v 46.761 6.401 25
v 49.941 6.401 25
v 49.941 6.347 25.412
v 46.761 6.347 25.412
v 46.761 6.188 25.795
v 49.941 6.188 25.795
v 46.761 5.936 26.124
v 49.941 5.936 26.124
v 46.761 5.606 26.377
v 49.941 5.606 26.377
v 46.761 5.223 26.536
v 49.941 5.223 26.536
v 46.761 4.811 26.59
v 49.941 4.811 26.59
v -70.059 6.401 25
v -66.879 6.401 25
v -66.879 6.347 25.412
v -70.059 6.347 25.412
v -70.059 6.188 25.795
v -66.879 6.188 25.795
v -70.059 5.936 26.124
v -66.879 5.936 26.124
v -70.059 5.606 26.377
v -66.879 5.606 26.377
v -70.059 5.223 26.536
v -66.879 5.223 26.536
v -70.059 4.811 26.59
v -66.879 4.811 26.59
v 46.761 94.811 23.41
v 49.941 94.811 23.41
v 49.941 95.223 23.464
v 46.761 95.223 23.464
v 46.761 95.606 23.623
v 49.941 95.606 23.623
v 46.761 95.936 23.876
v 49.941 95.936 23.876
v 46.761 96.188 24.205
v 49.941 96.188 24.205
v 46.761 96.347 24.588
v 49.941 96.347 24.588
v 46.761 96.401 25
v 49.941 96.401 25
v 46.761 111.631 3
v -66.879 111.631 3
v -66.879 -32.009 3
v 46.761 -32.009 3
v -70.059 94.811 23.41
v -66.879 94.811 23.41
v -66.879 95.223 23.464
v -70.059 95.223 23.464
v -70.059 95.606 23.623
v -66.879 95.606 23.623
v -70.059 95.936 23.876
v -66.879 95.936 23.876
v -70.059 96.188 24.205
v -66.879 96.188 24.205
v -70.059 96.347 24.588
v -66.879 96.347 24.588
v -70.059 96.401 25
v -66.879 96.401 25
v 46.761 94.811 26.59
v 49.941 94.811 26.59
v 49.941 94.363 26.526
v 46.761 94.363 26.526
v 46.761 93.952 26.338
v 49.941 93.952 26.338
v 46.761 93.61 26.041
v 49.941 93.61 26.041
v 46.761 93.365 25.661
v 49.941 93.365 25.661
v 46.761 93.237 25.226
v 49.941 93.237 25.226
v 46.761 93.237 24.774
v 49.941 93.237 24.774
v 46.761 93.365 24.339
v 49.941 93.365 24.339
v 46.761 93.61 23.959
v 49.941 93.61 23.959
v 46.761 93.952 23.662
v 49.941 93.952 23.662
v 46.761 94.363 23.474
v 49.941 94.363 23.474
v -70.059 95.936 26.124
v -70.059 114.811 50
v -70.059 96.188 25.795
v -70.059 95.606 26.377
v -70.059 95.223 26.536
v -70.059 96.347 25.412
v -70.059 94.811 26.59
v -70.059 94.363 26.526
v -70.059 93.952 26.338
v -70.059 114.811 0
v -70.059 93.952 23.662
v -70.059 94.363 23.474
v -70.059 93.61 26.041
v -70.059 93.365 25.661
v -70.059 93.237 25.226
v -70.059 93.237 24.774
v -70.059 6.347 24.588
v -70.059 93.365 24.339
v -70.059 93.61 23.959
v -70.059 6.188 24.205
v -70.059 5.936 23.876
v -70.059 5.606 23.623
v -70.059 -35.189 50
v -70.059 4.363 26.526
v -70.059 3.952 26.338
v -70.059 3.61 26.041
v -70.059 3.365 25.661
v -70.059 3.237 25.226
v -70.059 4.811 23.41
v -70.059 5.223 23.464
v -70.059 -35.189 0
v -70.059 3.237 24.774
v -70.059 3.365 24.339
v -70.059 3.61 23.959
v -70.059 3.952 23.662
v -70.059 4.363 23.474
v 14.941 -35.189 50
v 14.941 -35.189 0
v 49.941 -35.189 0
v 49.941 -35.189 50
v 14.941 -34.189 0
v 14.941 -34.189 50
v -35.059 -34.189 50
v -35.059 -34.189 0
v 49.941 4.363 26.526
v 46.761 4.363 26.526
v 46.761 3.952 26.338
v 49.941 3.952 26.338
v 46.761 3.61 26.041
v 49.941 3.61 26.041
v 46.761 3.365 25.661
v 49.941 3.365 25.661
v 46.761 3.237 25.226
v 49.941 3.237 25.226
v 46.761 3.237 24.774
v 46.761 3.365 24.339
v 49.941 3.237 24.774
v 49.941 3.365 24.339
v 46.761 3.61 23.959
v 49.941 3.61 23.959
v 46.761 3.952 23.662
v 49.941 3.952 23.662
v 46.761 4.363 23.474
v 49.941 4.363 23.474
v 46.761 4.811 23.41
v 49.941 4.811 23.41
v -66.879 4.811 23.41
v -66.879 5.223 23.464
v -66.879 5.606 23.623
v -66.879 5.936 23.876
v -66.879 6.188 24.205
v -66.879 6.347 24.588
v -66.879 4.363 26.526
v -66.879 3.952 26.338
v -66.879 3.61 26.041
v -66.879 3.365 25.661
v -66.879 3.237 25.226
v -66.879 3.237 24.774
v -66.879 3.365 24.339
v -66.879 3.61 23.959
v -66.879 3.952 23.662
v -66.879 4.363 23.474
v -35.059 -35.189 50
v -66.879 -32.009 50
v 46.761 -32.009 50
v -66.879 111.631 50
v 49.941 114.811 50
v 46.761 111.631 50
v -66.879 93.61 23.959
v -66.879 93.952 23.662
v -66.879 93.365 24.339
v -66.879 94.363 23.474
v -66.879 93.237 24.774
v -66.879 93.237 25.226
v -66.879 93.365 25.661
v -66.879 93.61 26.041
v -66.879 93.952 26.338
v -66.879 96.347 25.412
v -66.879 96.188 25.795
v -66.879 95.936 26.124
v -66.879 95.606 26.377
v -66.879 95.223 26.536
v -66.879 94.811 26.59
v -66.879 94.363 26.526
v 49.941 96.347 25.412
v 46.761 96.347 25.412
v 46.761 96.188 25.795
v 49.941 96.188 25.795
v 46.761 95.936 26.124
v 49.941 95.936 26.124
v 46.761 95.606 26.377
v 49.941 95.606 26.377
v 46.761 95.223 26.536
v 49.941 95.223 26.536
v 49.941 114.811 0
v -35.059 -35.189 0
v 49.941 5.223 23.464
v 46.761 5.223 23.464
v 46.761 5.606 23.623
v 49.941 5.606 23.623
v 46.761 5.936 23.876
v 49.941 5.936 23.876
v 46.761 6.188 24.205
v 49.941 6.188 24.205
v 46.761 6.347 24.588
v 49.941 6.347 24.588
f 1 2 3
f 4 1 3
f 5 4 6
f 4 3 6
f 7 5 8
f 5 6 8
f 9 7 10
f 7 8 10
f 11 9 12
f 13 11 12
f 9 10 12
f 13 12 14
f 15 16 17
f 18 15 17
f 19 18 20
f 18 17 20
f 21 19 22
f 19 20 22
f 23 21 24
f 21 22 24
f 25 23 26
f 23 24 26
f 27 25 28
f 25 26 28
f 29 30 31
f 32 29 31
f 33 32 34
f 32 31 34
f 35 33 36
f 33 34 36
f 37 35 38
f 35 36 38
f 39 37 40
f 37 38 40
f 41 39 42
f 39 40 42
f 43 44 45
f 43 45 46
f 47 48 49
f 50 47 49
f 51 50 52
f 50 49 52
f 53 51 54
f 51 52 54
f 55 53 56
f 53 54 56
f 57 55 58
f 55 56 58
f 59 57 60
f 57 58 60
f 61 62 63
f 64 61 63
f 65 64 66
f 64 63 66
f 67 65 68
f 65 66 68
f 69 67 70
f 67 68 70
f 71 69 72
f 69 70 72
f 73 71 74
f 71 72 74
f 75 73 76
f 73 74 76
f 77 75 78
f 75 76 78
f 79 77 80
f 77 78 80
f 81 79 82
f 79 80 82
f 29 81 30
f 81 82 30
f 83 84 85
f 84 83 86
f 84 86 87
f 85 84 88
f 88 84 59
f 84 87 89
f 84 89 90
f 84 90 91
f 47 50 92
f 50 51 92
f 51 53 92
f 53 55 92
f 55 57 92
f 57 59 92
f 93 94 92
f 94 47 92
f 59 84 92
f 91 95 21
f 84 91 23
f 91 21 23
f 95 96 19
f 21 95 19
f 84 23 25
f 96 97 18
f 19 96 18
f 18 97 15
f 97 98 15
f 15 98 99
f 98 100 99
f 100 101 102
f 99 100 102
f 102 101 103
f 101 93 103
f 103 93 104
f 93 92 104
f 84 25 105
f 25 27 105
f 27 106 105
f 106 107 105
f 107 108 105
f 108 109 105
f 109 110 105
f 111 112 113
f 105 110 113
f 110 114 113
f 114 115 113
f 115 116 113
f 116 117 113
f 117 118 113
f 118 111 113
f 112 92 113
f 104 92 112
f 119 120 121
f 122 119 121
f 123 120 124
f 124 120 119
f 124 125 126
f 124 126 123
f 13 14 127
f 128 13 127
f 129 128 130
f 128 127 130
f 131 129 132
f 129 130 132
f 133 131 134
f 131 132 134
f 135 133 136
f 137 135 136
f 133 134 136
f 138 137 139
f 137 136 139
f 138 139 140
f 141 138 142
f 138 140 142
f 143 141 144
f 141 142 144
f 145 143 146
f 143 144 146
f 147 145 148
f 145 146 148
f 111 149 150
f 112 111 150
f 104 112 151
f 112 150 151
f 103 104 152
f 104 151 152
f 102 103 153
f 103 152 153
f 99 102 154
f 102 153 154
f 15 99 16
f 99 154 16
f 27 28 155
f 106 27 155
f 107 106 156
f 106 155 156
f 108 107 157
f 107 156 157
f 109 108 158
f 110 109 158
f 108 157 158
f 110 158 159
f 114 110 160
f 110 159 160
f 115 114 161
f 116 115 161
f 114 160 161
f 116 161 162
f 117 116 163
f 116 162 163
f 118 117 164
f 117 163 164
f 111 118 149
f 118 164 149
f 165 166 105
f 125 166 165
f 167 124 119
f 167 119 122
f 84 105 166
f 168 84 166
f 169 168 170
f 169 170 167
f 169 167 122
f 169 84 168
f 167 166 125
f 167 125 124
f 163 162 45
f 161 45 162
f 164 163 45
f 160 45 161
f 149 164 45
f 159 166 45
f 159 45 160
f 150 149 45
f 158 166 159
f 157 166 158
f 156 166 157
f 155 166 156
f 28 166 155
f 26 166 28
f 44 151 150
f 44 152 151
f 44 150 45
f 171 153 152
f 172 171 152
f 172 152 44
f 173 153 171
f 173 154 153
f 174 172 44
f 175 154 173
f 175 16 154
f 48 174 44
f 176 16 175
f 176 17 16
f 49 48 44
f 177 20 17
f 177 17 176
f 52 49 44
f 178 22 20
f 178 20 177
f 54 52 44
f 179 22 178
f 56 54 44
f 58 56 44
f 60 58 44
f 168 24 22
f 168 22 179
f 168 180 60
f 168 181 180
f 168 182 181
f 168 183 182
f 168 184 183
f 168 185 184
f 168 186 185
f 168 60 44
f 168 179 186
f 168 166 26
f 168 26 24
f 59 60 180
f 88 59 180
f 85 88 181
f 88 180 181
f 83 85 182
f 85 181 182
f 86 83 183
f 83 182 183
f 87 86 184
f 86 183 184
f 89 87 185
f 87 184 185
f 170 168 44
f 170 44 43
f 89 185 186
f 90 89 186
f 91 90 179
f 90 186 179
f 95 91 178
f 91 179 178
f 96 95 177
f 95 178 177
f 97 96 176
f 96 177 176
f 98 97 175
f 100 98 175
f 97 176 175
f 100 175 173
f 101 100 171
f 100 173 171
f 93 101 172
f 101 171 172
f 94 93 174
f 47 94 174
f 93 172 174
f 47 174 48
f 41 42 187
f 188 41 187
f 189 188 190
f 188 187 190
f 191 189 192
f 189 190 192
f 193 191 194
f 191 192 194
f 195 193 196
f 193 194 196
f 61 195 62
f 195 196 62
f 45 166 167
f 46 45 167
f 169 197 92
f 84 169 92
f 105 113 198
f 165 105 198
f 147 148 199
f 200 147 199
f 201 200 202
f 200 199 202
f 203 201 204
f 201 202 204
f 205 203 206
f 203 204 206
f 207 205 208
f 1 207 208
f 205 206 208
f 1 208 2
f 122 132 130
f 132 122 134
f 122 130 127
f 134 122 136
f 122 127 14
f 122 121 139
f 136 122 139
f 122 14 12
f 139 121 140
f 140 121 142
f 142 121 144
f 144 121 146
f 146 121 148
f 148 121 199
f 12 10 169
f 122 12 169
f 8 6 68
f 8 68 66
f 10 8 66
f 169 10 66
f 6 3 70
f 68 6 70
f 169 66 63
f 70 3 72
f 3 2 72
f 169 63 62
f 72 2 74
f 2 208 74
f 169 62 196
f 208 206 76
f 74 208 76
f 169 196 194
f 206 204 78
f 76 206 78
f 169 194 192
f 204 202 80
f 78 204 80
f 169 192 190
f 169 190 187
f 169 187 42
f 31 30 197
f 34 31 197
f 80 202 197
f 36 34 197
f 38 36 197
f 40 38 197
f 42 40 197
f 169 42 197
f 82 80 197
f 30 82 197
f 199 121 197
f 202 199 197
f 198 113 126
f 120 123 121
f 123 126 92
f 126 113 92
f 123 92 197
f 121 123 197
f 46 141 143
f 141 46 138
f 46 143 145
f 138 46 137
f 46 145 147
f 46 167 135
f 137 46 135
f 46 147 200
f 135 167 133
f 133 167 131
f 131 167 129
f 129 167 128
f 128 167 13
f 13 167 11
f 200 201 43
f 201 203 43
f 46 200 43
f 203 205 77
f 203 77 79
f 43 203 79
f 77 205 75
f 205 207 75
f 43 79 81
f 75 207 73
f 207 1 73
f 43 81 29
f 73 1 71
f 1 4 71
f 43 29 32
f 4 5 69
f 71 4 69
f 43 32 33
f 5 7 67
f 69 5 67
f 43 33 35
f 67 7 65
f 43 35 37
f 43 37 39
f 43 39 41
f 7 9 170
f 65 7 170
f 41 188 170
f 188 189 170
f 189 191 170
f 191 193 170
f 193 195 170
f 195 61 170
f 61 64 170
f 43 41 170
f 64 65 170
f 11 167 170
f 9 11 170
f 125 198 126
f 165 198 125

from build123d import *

# Parameters (mm, degrees)
F0_W     = 113.645
F0_H     = 3.18
F0_W_2   = 3.175
F0_H_2   = 143.64
F0_W_3   = 3.18
F1_DEPTH = 50
F2_W     = 113.64
F2_H     = 143.64
F3_DEPTH = 47
F5_DEPTH = 120.001
F6_W     = 50
F6_H     = 50
F7_DEPTH = 1


with BuildPart() as f1:
    # F0 (on Top) → F1 (new body)
    with BuildSketch(Plane.XY):
        with Locations((-10.0610243238, 113.2212999272)):
            Rectangle(F0_W, F0_H)
        with Locations((-68.4710243238, 113.2212999272)):
            Rectangle(F0_W_2, F0_H)
        with Locations((-68.4710243238, 39.8112999272)):
            Rectangle(F0_W_2, F0_H_2)
        with Locations((-10.0610243238, -33.5987000728)):
            Rectangle(F0_W, F0_H)
        with Locations((48.3514756762, 39.8112999272)):
            Rectangle(F0_W_3, F0_H_2)
        with Locations((48.3514756762, -33.5987000728)):
            Rectangle(F0_W_3, F0_H)
        with Locations((48.3514756762, 113.2212999272)):
            Rectangle(F0_W_3, F0_H)
        with Locations((-68.4710243238, -33.5987000728)):
            Rectangle(F0_W_2, F0_H)
        with Locations((-10.0610243238, 39.8112999272)):
            Rectangle(F0_W, F0_H_2)
    extrude(amount=F1_DEPTH)

    # F2 (on face) → F3 (cut)
    with BuildSketch(Plane.XY.offset(50)):
        with Locations((-10.0585243238, 39.8112999272)):
            Rectangle(F2_W, F2_H)
    extrude(amount=-F3_DEPTH, mode=Mode.SUBTRACT)

    # F4 (on face) → F5 (cut, through all)
    with BuildSketch(Plane.YZ.offset(49.9414756762)):
        with BuildLine():
            ThreePointArc((6.4012999272, 25), (5.9355997093, 26.1242997821), (4.8112999272, 26.59))
            Line((4.8112999272, 26.59), (4.8112999272, 23.41))
            ThreePointArc((4.8112999272, 23.41), (5.9355997093, 23.8757002179), (6.4012999272, 25))
        make_face()
        with BuildLine():
            Line((4.8112999272, 23.41), (4.8112999272, 26.59))
            ThreePointArc((4.8112999272, 26.59), (3.2212999272, 25), (4.8112999272, 23.41))
        make_face()
        with BuildLine():
            ThreePointArc((96.4012999272, 25), (95.9355997093, 26.1242997821), (94.8112999272, 26.59))
            Line((94.8112999272, 26.59), (94.8112999272, 23.41))
            ThreePointArc((94.8112999272, 23.41), (95.9355997093, 23.8757002179), (96.4012999272, 25))
        make_face()
        with BuildLine():
            Line((94.8112999272, 23.41), (94.8112999272, 26.59))
            ThreePointArc((94.8112999272, 26.59), (93.2212999272, 25), (94.8112999272, 23.41))
        make_face()
    extrude(amount=-F5_DEPTH, mode=Mode.SUBTRACT)

    # F6 (on face) → F7 (cut)
    with BuildSketch(Plane.XZ.offset(35.1887000728)):
        with Locations((-10.0585243238, 25)):
            Rectangle(F6_W, F6_H)
    extrude(amount=-F7_DEPTH, mode=Mode.SUBTRACT)


solid = f1.part
